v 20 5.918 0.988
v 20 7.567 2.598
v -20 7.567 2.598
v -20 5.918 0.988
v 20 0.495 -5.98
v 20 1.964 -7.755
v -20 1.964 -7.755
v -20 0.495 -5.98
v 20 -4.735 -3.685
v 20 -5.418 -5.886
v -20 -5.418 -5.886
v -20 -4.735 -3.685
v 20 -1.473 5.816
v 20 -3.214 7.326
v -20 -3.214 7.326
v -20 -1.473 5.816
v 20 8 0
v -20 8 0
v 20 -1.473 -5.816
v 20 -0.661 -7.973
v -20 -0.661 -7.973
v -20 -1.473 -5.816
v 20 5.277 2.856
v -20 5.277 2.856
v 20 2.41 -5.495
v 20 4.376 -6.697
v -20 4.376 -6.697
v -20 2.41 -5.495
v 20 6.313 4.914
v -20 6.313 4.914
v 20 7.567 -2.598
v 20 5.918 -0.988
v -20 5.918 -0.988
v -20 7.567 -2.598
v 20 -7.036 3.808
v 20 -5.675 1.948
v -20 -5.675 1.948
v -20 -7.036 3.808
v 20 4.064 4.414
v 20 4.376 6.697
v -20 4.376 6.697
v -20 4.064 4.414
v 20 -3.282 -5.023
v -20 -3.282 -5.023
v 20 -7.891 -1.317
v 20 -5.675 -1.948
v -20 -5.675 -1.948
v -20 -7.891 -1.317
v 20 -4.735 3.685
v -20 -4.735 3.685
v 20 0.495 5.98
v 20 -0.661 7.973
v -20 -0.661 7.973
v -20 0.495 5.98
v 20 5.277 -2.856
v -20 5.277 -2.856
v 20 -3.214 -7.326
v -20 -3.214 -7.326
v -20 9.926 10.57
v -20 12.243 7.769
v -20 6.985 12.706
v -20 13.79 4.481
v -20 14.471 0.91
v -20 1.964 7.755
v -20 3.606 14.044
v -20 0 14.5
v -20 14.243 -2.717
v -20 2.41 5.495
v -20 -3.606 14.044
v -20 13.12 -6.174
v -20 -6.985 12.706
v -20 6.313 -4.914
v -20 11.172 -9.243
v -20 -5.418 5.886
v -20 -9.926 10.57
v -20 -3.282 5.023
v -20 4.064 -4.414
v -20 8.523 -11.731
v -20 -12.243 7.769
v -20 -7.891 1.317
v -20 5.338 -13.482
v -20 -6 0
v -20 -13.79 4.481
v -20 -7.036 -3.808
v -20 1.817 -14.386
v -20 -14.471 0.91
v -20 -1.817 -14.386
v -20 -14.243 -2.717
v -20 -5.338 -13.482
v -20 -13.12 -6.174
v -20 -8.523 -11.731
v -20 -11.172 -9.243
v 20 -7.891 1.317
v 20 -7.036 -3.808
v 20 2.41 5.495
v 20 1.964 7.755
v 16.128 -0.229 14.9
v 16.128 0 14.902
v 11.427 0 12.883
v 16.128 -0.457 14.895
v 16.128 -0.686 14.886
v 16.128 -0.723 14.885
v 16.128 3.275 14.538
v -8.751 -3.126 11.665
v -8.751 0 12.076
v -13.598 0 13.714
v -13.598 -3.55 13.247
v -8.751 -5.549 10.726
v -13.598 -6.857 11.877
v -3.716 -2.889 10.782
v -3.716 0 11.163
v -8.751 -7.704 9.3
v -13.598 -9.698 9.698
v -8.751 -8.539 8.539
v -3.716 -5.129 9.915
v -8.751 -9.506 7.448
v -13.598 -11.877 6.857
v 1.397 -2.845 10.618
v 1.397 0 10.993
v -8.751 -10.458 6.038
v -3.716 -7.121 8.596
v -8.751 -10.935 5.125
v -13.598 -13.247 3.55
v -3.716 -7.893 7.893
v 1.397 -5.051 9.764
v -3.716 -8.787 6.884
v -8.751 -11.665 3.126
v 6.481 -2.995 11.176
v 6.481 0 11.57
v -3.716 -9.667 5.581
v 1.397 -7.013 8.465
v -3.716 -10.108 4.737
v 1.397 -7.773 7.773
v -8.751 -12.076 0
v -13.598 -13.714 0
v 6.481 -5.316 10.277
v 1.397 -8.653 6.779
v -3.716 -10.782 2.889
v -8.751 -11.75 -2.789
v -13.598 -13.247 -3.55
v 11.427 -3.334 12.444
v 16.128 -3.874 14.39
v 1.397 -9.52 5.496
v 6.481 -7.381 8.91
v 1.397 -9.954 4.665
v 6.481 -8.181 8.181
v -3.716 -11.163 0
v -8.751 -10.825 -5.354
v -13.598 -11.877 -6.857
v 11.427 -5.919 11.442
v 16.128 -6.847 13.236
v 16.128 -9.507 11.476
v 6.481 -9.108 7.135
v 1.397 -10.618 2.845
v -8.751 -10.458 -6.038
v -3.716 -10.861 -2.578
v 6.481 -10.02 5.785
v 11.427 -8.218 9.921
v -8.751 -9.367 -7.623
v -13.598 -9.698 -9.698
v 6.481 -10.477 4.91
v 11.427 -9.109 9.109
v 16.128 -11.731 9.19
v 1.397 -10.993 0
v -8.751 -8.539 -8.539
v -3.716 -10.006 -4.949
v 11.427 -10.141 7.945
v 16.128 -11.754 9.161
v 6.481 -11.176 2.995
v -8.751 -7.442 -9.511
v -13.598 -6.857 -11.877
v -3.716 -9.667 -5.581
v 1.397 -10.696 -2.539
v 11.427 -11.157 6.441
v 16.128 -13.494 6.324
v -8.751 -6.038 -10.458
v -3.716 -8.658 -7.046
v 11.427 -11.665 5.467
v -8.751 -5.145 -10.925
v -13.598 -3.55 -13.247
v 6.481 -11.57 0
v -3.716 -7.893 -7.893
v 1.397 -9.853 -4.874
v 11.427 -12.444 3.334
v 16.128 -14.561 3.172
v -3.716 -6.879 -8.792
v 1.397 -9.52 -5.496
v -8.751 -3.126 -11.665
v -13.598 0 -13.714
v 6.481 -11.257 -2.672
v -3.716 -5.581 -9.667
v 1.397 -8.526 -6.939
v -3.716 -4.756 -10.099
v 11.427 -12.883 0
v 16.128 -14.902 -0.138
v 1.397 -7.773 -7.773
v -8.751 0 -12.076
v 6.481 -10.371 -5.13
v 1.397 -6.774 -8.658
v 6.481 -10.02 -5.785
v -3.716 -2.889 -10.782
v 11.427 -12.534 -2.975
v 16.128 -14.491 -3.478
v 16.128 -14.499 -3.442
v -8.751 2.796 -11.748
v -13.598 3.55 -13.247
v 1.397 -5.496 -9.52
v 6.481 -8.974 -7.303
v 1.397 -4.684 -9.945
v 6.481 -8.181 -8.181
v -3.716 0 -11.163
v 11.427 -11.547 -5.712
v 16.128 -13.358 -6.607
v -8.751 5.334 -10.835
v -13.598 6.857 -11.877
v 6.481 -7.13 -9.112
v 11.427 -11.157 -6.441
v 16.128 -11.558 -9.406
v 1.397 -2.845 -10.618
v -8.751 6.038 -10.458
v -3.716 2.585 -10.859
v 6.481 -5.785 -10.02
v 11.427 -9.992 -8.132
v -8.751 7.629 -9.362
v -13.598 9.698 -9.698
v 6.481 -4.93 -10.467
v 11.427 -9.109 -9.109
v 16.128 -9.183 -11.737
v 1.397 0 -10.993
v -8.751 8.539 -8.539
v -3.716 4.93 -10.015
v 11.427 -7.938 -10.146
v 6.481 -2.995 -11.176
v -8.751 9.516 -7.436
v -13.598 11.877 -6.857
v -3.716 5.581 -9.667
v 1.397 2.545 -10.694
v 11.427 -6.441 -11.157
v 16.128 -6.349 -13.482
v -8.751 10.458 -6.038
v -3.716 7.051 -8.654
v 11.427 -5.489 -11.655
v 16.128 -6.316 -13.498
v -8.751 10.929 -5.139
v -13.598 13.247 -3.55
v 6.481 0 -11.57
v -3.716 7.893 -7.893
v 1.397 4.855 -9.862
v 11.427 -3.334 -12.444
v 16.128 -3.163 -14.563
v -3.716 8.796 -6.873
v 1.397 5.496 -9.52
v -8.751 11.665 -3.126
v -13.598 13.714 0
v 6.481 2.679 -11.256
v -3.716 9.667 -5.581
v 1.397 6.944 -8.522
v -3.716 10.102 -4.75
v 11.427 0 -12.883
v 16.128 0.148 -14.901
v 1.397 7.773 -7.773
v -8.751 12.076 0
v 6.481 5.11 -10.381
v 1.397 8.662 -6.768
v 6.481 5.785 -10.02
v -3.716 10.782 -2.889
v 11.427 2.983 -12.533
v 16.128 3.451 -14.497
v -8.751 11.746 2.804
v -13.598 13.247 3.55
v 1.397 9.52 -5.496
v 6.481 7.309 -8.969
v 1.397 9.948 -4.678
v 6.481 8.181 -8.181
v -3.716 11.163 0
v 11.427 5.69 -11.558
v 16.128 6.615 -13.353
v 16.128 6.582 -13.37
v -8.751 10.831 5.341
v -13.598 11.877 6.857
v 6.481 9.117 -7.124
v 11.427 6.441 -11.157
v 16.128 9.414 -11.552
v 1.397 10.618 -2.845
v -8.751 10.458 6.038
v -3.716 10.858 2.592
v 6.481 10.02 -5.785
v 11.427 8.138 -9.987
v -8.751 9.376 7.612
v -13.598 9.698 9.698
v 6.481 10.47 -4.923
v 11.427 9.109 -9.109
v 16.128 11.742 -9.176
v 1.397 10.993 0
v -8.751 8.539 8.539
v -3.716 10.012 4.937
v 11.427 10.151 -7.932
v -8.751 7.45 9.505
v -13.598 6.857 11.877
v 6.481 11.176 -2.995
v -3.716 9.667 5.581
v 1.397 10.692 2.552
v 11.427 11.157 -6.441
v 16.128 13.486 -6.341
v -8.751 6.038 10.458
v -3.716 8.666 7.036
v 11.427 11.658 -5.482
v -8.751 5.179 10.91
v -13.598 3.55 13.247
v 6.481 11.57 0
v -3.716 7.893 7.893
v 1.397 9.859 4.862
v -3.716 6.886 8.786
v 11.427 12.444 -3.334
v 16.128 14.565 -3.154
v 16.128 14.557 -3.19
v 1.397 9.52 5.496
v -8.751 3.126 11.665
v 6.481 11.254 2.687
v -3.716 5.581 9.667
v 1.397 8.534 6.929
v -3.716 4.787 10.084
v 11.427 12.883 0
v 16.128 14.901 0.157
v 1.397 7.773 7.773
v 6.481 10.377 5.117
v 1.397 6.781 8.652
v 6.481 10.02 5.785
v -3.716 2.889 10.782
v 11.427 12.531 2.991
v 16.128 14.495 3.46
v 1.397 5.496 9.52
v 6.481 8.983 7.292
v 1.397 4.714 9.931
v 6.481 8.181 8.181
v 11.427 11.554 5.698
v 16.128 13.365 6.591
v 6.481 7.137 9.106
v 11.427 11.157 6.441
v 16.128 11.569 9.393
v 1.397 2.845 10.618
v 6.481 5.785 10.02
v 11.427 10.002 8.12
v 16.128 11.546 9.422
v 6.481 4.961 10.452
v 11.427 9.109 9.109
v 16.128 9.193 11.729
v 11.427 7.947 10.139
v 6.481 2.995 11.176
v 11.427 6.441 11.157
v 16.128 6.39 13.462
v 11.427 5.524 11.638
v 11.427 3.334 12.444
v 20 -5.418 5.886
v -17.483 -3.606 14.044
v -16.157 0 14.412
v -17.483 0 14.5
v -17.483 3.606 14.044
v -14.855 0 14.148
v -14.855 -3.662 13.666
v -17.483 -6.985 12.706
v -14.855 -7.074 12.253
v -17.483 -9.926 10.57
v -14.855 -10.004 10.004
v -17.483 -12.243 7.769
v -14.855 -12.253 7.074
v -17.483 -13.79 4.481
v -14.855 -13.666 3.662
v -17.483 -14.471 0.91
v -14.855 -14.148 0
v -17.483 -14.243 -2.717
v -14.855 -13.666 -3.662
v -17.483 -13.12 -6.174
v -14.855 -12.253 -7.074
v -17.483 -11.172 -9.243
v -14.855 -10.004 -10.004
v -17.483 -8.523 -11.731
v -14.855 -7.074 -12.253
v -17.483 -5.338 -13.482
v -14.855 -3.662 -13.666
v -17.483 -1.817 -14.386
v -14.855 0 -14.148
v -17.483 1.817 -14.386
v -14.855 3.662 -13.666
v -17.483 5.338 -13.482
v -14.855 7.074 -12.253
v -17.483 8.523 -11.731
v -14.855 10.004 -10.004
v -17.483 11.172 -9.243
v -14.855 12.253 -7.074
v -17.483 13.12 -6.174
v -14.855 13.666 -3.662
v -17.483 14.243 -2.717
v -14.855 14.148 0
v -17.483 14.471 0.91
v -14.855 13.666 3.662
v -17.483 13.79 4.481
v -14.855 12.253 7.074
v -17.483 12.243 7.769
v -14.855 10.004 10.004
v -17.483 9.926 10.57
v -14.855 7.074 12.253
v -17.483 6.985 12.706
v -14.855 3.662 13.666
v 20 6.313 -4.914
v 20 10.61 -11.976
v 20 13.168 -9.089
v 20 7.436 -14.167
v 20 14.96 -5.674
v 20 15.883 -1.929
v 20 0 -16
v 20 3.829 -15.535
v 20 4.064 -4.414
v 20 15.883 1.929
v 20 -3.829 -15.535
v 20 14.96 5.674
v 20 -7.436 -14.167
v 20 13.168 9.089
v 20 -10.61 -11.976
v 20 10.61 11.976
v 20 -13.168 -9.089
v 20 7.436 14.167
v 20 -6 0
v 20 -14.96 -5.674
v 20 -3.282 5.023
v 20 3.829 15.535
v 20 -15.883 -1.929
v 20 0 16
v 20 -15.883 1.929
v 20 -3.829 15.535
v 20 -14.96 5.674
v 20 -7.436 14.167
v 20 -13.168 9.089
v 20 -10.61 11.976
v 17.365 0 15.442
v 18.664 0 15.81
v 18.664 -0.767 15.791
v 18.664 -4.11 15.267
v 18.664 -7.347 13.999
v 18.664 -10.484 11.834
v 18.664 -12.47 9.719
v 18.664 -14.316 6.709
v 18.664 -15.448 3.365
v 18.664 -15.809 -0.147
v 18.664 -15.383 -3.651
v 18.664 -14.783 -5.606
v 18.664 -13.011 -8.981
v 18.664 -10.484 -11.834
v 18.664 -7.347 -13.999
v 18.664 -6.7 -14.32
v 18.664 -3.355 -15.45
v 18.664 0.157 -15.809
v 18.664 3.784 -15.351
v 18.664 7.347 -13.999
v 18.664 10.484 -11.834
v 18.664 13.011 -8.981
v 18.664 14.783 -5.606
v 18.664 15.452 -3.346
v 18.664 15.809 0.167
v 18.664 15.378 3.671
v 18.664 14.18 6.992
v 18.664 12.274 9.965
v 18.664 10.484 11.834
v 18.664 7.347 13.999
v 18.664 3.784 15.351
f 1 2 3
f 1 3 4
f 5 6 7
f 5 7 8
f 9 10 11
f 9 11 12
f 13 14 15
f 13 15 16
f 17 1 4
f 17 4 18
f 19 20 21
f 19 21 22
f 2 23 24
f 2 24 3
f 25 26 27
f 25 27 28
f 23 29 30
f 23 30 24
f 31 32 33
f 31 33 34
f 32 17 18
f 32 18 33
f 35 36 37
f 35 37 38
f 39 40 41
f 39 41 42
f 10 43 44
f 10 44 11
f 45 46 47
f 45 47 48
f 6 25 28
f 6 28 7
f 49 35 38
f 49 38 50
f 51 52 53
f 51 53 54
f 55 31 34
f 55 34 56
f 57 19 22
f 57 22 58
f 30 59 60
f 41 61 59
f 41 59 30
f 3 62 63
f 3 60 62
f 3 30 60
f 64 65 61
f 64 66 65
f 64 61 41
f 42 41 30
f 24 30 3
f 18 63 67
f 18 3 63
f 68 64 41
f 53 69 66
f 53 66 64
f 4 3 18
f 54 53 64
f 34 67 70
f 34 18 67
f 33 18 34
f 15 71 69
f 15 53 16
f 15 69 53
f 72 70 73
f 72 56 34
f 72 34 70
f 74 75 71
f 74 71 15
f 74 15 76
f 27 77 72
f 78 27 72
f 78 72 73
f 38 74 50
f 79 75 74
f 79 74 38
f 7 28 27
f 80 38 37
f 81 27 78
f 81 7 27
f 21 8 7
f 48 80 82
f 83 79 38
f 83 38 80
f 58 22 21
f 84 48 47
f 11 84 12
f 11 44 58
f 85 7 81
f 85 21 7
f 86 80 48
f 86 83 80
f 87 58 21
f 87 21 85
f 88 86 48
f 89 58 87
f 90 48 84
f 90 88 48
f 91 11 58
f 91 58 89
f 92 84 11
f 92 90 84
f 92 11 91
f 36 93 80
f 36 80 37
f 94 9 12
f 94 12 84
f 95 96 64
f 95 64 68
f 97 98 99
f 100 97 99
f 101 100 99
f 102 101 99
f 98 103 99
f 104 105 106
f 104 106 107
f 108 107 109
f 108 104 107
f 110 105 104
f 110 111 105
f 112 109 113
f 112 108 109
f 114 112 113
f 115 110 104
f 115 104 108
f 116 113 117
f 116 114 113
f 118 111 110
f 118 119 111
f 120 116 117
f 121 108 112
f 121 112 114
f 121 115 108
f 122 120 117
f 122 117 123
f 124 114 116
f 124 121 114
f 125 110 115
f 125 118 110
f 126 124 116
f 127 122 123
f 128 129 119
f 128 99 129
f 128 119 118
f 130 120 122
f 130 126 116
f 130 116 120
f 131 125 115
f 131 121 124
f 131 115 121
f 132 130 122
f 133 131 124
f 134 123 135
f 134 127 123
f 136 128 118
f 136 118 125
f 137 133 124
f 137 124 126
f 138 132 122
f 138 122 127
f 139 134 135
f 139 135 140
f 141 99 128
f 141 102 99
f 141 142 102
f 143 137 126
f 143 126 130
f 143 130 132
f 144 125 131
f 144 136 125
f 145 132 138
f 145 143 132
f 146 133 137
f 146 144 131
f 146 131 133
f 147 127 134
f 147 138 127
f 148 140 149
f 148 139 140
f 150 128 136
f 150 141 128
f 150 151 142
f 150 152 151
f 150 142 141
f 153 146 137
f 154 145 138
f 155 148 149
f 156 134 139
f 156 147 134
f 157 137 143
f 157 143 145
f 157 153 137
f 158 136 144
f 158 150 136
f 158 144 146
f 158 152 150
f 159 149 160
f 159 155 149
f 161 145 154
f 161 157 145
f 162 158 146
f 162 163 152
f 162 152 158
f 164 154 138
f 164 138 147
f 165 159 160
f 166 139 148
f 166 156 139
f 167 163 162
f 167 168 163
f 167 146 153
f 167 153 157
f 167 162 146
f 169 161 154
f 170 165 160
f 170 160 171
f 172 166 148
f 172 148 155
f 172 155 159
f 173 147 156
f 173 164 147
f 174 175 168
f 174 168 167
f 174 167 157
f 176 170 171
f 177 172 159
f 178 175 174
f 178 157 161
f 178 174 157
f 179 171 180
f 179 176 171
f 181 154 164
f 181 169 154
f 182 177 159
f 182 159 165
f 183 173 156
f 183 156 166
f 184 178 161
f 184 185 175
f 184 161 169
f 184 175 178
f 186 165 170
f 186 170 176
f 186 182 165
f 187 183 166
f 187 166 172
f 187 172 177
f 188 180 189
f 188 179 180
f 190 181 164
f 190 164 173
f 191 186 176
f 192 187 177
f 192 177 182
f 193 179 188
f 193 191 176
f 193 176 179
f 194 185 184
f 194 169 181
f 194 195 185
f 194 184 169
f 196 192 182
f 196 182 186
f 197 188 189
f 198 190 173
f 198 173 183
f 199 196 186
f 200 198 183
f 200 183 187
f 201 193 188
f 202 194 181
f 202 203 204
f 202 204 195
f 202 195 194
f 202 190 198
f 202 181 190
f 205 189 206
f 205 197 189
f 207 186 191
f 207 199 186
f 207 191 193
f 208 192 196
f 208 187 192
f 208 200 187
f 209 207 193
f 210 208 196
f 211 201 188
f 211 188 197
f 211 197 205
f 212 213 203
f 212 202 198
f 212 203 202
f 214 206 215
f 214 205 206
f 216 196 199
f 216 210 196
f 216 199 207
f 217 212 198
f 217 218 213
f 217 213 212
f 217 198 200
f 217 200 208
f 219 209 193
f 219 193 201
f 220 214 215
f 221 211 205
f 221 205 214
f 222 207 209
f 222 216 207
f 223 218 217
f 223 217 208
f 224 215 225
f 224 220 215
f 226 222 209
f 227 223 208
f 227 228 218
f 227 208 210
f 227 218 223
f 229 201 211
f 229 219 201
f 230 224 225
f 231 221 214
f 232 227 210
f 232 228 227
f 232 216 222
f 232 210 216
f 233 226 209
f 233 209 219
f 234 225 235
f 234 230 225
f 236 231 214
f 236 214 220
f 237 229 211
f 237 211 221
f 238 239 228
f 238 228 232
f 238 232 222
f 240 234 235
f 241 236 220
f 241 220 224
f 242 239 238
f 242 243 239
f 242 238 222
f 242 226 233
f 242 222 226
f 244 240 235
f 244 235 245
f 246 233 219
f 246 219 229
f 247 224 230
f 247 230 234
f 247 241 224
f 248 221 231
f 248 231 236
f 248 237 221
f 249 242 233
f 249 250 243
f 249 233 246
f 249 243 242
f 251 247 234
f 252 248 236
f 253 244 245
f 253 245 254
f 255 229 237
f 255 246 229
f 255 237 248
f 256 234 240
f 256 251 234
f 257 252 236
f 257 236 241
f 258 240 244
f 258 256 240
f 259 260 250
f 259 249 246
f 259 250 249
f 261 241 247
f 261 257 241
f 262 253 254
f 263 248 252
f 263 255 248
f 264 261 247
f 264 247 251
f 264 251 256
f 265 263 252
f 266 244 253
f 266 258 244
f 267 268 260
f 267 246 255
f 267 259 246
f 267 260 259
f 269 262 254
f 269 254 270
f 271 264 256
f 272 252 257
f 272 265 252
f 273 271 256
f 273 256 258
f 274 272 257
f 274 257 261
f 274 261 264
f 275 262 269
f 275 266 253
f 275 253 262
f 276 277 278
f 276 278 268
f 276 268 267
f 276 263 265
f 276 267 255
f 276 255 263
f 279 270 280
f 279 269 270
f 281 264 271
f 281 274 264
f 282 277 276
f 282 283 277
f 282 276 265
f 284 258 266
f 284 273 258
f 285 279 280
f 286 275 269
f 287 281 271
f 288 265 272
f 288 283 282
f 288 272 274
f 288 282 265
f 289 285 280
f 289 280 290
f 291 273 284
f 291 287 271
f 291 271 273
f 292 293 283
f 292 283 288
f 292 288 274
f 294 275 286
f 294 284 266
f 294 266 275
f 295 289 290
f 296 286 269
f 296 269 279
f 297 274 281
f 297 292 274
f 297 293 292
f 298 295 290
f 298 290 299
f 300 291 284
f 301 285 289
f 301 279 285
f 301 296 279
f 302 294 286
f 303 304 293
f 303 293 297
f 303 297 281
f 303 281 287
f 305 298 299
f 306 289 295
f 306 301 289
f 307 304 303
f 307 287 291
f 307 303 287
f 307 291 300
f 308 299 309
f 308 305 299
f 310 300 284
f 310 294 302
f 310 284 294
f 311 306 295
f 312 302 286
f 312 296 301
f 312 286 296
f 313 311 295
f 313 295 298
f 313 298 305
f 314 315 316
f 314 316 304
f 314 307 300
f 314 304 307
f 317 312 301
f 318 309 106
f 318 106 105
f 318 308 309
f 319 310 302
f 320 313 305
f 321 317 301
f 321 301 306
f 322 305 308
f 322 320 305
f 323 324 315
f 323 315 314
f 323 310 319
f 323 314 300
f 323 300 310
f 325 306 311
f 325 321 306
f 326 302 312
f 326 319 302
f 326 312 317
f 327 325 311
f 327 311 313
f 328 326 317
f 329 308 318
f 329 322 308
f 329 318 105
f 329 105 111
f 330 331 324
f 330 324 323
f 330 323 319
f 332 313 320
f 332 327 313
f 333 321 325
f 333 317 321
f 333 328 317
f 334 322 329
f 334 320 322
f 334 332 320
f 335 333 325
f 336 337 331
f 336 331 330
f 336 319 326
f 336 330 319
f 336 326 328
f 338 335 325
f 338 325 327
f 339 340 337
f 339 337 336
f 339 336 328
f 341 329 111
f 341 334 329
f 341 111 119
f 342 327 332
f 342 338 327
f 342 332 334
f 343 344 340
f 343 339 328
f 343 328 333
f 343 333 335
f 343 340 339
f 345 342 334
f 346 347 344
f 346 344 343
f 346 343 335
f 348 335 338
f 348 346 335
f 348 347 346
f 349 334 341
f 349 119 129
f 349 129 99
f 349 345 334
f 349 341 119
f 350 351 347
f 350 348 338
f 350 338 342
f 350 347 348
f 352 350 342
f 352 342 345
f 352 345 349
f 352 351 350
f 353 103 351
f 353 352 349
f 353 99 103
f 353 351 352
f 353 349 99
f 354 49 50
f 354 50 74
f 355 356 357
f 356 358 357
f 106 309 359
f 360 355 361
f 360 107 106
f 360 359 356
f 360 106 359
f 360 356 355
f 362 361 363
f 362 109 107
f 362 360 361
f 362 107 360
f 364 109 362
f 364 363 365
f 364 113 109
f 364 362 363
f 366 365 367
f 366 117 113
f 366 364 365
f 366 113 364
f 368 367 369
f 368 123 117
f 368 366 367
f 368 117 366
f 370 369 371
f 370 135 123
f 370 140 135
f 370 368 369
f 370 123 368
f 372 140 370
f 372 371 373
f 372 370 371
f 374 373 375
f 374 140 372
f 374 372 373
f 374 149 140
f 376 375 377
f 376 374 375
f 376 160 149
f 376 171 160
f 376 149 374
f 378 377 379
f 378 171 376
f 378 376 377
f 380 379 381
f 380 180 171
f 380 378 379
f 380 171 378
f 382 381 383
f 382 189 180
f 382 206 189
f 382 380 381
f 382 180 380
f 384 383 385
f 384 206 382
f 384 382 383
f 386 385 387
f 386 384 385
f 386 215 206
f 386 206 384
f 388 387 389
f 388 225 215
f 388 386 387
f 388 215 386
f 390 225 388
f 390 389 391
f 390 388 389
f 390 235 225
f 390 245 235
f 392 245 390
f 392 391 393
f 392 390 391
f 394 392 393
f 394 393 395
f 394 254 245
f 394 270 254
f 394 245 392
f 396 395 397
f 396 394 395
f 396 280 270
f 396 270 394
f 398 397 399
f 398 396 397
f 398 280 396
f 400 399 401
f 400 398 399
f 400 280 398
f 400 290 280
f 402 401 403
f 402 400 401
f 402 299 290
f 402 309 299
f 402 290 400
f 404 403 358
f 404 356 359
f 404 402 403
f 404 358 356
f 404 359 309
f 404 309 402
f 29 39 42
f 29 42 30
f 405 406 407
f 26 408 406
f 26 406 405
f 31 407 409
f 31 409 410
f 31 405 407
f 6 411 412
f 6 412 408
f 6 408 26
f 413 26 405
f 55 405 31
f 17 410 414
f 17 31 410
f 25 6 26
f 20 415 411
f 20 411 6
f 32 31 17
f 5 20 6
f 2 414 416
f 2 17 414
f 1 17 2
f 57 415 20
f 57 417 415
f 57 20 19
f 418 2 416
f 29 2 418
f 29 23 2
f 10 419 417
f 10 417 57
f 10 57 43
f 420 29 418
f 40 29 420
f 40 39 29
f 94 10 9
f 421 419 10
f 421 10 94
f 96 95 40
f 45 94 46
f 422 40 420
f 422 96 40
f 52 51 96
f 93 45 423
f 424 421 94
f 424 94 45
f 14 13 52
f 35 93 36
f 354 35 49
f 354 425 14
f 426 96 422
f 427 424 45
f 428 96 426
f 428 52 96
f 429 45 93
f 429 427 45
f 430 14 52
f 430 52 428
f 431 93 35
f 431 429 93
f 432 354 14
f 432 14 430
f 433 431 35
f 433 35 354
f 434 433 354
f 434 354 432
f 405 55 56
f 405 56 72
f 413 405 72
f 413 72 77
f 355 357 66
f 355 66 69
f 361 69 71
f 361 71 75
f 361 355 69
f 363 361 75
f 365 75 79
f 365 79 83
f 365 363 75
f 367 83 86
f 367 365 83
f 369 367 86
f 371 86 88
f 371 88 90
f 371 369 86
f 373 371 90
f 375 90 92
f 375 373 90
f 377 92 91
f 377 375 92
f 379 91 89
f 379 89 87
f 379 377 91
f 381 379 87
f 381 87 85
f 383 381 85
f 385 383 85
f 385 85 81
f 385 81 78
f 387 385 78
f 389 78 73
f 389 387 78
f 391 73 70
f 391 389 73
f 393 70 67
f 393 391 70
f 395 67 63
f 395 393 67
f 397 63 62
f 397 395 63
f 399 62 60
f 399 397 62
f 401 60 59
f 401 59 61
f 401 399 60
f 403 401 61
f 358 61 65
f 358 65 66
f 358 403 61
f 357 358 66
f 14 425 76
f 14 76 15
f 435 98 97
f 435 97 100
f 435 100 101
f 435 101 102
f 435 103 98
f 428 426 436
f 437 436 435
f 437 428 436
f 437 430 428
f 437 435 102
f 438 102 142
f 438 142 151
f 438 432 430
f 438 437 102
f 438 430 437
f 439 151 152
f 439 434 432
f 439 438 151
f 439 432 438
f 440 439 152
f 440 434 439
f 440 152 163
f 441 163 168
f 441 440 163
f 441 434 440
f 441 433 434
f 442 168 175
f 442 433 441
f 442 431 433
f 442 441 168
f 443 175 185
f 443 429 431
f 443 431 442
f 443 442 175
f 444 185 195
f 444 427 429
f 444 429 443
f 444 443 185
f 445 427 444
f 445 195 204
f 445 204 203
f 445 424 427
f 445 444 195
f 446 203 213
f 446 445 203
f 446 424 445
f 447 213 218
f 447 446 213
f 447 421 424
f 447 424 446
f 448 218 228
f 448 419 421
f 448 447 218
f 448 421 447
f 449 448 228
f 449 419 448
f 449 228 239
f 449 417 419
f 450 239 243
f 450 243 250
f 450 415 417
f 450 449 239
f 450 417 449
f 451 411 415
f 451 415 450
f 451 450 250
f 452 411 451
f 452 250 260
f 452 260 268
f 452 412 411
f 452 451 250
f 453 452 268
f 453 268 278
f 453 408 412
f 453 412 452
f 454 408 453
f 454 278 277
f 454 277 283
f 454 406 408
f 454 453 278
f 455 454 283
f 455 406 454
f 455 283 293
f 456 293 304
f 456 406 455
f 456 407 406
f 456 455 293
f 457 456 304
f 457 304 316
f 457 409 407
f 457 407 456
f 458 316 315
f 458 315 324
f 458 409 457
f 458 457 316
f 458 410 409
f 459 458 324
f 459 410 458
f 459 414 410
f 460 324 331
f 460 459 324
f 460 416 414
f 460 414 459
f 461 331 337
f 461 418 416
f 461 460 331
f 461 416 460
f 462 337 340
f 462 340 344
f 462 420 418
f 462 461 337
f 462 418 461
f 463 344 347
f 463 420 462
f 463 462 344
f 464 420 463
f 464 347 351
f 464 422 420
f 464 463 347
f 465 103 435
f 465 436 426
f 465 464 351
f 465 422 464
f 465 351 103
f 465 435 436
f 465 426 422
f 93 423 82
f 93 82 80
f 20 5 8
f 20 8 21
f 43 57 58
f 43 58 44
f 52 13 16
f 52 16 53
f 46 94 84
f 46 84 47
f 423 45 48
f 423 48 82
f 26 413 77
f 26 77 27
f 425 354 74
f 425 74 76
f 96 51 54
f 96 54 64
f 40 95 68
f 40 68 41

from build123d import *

# Parameters (mm, degrees)
CUT_EXTRUDE1_DEPTH = 46.95650117230423
FILLET1_R          = 10


with BuildPart() as part:
    # Sketch1 → Revolve1 (revolve)
    with BuildSketch(Plane.XY, mode=Mode.PRIVATE) as revolve1_sk:
        with BuildLine():
            Line((-20, 4.7625), (-20, 14.5))
            Line((-20, 14.5), (-15.328636266651278, 14.5))
            ThreePointArc((-15.328636266651278, 14.5), (1.5695766523512105, 11), (18.08622279664887, 16))
            Line((18.08622279664887, 16), (20, 16))
            Line((20, 16), (20, 4.7625))
            Line((20, 4.7625), (16.825, 4.7625))
            Line((16.825, 4.7625), (16.825, 3.96875))
            Line((16.825, 3.96875), (-16.825, 3.96875))
            Line((-16.825, 3.96875), (-16.825, 4.7625))
            Line((-16.825, 4.7625), (-20, 4.7625))
        make_face()
    revolve(revolve1_sk.sketch.rotate(Axis((-20, 0, 0), (1, 0, 0)), 90), axis=Axis((-20, 0, 0), (1, 0, 0)))

    # Sketch2 → Cut-Extrude1 (cut, through all)
    with BuildSketch(Plane(origin=(20, 0, 0), x_dir=(0, 0, -1), z_dir=(1, 0, 0))):
        Polygon((-0.9875675416844027, 5.918167820416334), (0, 8), (0.9875675416844045, 5.918167820416334), (2.5975957536374685, 7.56653793360508), (2.855684358222442, 5.276842507238936), (4.913701701517343, 6.313124075171151), (4.414343464038791, 4.06368942975445), (6.69733182610023, 4.375585264979419), (5.494639959930347, 2.4101725479178207), (7.7552021275146465, 1.9638838971263979), (5.979506958040023, 0.4954760728339973), (7.972675944053363, -0.6606347637786543), (5.8164015956359885, -1.47291292284479), (7.326186613240466, -3.2135633972237505), (5.022998869575178, -3.2816889487345575), (5.885791285385062, -5.418252573005925), (3.685276276138015, -4.7348430563783594), (3.807579144296598, -7.035790009651912), (1.948196815228109, -5.674903450203807), (1.3167567222458805, -7.890890427221779), (8.4e-15, -6), (-1.3167567222458623, -7.8908904272217795), (-1.9481968152280928, -5.674903450203809), (-3.80757914429658, -7.035790009651914), (-3.685276276137998, -4.7348430563783666), (-5.885791285385044, -5.418252573005935), (-5.022998869575163, -3.2816889487345664), (-7.326186613240452, -3.213563397223763), (-5.816401595635977, -1.4729129228448008), (-7.9726759440533534, -0.6606347637786659), (-5.979506958040015, 0.4954760728339881), (-7.75520212751464, 1.9638838971263866), (-5.4946399599303435, 2.4101725479178118), (-6.697331826100229, 4.375585264979409), (-4.41434346403879, 4.063689429754444), (-4.913701701517344, 6.313124075171145), (-2.855684358222442, 5.276842507238932), (-2.5975957536374694, 7.566537933605075), align=None)
    extrude(amount=-CUT_EXTRUDE1_DEPTH, mode=Mode.SUBTRACT)

    # Fillet1
    # the kernel refuses this fillet: 10 mm, written as the material it takes off along each edge
    with BuildSketch(Plane(origin=(18.08622279664887, 0, 0), x_dir=(0, 1.1e-16, 1), z_dir=(0, 1, -1.1e-16))) as fillet1_piece_1:
        with BuildLine():
            CenterArc((6.027123801609688, 2.6498073192975404), FILLET1_R, 332.5612146984912, 23.217826405433588)
            Line((15.999999999999996, 1.913777203351131), (16.1994575239678, 1.8990566010322034))
            ThreePointArc((16.1994575239678, 1.8990566010322034), (16.2, 0.9568886016755656), (16.199999999999996, 0))
            Line((16.199999999999996, 0), (16.17122736238995, -0.10334984455228025))
            ThreePointArc((16.17122736238995, -0.10334984455228025), (15.609829730901891, -1.0681006002986955), (15.079661114712898, -2.050359506983643))
            Line((15.079661114712898, -2.050359506983643), (14.902160383083423, -1.9581993731349918))
        make_face()
    revolve(axis=Axis((18.08622279664887, 0, 0), (1, 0, 0)), mode=Mode.SUBTRACT)
    with BuildSketch(Plane(origin=(-15.328636266651278, 0, 0), x_dir=(0, 1.1e-16, 1), z_dir=(0, 1, -1.1e-16))) as fillet1_piece_2:
        with BuildLine():
            CenterArc((4.5, -2.1548222421926884), FILLET1_R, 0, 22.862521626171226)
            Line((13.714397426275884, 1.7303907597726322), (13.898685374801401, 1.8080950198119385))
            ThreePointArc((13.898685374801401, 1.8080950198119385), (14.277562788256734, 0.9425411788785816), (14.67979879096138, 0.08759220723800709))
            Line((14.67979879096138, 0.08759220723800709), (14.7, 0))
            Line((14.7, 0), (14.7, -2.1548222421926884))
            Line((14.7, -2.1548222421926884), (14.5, -2.1548222421926884))
        make_face()
    revolve(axis=Axis((-15.328636266651278, 0, 0), (1, 0, 0)), mode=Mode.SUBTRACT)


solid = part.part
